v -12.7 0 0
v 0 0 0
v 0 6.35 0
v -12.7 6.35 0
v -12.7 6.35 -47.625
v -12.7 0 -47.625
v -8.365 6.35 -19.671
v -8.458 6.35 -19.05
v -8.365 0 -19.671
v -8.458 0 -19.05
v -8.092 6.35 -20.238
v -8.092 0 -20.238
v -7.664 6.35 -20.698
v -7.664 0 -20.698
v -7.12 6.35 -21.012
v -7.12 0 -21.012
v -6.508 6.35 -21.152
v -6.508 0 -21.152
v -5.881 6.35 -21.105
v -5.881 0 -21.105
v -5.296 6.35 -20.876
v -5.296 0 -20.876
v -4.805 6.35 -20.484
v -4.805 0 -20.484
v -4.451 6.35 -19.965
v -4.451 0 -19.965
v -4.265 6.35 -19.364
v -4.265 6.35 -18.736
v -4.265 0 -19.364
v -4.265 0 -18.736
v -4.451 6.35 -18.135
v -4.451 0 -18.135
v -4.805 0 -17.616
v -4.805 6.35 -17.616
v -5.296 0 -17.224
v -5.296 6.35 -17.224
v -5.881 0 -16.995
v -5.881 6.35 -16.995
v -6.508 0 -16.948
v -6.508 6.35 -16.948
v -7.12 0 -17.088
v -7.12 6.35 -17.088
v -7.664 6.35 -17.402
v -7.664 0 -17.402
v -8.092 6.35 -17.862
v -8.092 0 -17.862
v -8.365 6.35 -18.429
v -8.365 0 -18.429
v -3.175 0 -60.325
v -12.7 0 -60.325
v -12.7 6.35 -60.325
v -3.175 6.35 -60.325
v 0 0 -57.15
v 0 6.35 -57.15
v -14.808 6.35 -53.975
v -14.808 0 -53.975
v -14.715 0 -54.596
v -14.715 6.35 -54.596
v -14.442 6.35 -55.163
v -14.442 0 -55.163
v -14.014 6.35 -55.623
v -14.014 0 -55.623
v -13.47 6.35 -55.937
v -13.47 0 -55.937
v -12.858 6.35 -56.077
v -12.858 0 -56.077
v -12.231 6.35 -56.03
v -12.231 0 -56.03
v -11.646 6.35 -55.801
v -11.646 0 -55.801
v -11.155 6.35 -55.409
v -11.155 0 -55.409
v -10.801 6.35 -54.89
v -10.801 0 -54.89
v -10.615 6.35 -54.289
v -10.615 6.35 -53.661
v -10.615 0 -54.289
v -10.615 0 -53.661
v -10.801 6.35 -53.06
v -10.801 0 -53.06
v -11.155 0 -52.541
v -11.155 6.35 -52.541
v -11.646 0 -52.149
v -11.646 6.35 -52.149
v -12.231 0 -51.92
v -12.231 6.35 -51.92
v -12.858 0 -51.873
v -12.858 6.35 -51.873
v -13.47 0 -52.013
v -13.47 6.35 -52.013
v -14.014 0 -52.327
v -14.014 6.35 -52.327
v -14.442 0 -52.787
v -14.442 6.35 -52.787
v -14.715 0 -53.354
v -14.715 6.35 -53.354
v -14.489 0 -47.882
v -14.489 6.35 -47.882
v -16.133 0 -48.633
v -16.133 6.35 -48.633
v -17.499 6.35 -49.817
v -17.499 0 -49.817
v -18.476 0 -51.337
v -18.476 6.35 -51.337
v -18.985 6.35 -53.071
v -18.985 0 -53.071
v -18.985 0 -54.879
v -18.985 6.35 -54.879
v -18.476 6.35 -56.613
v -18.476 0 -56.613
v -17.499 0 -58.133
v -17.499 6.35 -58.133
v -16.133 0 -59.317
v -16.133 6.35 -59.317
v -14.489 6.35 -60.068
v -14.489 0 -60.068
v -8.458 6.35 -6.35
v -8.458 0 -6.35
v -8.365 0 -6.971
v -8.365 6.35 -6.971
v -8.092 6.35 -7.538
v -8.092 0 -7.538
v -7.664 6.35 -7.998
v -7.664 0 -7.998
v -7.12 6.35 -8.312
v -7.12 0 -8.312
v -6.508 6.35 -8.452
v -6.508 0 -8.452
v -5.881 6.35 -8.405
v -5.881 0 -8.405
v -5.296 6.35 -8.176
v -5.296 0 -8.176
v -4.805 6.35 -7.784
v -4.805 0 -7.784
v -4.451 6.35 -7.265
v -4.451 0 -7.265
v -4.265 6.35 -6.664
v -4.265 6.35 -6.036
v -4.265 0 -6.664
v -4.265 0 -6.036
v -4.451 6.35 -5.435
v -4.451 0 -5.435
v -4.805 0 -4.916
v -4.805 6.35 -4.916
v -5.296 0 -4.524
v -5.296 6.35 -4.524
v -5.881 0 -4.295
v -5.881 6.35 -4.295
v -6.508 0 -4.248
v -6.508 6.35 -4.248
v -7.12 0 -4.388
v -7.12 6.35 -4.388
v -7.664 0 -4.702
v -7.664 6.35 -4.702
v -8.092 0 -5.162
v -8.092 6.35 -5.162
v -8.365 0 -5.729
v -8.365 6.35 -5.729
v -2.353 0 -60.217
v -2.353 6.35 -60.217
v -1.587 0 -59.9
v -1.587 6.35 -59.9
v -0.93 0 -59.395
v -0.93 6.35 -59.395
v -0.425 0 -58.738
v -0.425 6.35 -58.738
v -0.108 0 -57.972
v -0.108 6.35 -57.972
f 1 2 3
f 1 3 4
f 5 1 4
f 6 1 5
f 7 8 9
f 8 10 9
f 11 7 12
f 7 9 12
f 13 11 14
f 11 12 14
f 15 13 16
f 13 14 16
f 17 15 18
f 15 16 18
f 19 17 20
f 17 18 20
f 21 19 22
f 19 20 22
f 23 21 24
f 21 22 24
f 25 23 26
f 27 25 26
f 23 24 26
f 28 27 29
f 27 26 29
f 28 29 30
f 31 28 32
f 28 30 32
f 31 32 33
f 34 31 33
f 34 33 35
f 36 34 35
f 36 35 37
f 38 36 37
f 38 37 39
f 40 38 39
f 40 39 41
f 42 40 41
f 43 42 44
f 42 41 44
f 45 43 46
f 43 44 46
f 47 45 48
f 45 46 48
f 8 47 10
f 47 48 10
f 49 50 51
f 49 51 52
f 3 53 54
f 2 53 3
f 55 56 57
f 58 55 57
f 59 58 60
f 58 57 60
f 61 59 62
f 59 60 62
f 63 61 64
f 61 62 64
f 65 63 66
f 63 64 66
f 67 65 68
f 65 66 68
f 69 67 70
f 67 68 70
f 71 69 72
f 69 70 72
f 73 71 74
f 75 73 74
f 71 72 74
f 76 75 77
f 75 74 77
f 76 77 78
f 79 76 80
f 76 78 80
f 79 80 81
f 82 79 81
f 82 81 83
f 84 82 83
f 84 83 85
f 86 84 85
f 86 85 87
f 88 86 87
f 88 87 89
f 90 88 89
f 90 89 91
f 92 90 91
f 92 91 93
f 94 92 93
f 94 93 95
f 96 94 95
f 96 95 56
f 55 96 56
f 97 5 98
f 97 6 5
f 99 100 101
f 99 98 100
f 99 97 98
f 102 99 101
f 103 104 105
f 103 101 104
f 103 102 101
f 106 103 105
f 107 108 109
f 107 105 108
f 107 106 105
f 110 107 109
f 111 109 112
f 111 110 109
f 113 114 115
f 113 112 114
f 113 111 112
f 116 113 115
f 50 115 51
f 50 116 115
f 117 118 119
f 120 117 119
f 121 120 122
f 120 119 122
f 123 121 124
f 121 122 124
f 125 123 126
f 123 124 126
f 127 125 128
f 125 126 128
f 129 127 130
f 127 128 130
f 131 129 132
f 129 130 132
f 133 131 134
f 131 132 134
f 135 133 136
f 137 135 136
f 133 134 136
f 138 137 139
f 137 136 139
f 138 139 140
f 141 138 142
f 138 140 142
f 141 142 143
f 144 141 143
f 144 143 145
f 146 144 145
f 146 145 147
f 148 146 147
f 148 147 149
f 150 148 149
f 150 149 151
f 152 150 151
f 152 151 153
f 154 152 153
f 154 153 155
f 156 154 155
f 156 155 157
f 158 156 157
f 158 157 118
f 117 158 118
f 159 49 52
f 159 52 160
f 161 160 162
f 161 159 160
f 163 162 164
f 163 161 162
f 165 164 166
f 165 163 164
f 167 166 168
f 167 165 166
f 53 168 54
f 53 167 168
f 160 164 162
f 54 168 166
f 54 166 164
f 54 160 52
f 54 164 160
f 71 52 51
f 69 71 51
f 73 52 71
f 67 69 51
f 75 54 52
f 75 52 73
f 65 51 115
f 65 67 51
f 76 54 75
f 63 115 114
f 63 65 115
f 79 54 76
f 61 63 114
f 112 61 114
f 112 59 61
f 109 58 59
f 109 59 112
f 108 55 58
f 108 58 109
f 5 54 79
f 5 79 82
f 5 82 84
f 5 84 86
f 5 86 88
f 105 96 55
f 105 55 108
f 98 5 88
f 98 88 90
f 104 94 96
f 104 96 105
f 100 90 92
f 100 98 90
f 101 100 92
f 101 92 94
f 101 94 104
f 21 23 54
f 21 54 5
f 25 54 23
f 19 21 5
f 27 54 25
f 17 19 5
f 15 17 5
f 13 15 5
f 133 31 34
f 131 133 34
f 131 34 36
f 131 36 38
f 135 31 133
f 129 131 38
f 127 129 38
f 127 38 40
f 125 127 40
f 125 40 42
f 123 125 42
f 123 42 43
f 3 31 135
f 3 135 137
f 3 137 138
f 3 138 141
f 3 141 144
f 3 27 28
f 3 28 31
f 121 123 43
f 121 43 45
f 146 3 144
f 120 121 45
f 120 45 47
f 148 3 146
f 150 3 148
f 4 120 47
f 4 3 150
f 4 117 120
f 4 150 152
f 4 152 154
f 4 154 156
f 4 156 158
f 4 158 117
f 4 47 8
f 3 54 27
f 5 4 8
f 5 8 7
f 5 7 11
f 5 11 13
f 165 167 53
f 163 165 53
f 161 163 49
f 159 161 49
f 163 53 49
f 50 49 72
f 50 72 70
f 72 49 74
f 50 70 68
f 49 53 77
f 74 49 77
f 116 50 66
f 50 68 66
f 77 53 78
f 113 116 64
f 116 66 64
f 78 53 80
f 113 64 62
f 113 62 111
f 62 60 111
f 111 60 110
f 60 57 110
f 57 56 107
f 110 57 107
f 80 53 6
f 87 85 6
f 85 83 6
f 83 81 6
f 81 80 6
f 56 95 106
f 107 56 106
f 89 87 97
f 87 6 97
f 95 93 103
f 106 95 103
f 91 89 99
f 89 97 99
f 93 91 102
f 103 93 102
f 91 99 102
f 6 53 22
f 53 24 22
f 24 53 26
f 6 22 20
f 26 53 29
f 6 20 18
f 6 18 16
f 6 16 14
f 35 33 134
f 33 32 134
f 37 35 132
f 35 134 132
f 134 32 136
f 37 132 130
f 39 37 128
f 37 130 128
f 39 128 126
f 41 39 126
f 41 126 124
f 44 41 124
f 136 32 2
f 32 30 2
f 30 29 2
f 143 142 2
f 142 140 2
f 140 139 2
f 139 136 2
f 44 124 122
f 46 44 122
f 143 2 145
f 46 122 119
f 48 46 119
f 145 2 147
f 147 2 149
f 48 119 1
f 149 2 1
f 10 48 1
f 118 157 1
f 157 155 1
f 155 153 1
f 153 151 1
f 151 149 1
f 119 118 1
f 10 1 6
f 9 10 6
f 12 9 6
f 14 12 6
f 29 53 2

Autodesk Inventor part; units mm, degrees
ref_plane "YZ Plane" through (0, 0, 0) normal (1, 0, 0) x (0, 1, 0)
ref_plane "XZ Plane" through (0, 0, 0) normal (0, 1, 0) x (-1, 0, 0)
ref_plane "XY Plane" through (0, 0, 0) normal (0, 0, 1) x (1, 0, 0)
sketch "Sketch1" plane through (0, 0, 0) normal (0, 1, 0) x (-1, 0, 0)
  line L0 (0, 0) -> (12.7, 0)
  line L1 (12.7, 0) -> (12.7, -47.625)
  line L2 (12.7, -47.625) -> (0, -47.625)
  line L3 (0, -47.625) -> (0, 0)
  line L4 (6.35, 0) -> (6.35, -6.35)
  circle A0 centre (6.35, -6.35) radius 2.1082
  line L5 (6.35, -6.35) -> (6.35, -19.05)
  circle A1 centre (6.35, -19.05) radius 2.1082
  line L6 (6.35, -19.05) -> (6.35, -53.975)
  line L7 (6.35, -53.975) -> (12.7, -53.975)
  circle A2 centre (12.7, -53.975) radius 2.1082
  line L8 (12.7, -53.975) -> (12.7, -60.325)
  arc A3 (12.7, -60.325) -> (12.7, -47.625) centre (12.7, -53.975) ccw
  line L9 (0, -47.625) -> (0, -53.975)
  line L10 (12.7, -60.325) -> (3.175, -60.325)
  line L11 (0, -57.15) -> (0, -53.975)
  arc A4 (0, -57.15) -> (3.175, -60.325) centre (3.175, -57.15) ccw
  dimension "d0" = 12.7
  dimension "d1" = 6.35
  dimension "d2" = 4.2164
  dimension "d3" = 47.625
  dimension "d4" = 12.7
  dimension "d5" = 34.925
  dimension "d6" = 6.35
  dimension "d7" = 4.2164
  dimension "d8" = 6.35
  dimension "d9" = 3.175
extrude "Extrusion1" add sketch "Sketch1" along normal blind 6.35 contours L0 L4 A0 L5 A1 L6 L2 L3 | L0 L1 L2 L6 A1 L5 A0 L4 | L2 L6 L7 A2 L8 L10 A4 L11 L9 | L2 A3 L8 A2 L7 L6
sketch "Sketch2" plane through (0, 6.35, 0) normal (0, 1, 0) x (1, 0, 0)
  point P0 (0, 0)
properties part number "wing mount printed version" material "Aluminum 6061"
